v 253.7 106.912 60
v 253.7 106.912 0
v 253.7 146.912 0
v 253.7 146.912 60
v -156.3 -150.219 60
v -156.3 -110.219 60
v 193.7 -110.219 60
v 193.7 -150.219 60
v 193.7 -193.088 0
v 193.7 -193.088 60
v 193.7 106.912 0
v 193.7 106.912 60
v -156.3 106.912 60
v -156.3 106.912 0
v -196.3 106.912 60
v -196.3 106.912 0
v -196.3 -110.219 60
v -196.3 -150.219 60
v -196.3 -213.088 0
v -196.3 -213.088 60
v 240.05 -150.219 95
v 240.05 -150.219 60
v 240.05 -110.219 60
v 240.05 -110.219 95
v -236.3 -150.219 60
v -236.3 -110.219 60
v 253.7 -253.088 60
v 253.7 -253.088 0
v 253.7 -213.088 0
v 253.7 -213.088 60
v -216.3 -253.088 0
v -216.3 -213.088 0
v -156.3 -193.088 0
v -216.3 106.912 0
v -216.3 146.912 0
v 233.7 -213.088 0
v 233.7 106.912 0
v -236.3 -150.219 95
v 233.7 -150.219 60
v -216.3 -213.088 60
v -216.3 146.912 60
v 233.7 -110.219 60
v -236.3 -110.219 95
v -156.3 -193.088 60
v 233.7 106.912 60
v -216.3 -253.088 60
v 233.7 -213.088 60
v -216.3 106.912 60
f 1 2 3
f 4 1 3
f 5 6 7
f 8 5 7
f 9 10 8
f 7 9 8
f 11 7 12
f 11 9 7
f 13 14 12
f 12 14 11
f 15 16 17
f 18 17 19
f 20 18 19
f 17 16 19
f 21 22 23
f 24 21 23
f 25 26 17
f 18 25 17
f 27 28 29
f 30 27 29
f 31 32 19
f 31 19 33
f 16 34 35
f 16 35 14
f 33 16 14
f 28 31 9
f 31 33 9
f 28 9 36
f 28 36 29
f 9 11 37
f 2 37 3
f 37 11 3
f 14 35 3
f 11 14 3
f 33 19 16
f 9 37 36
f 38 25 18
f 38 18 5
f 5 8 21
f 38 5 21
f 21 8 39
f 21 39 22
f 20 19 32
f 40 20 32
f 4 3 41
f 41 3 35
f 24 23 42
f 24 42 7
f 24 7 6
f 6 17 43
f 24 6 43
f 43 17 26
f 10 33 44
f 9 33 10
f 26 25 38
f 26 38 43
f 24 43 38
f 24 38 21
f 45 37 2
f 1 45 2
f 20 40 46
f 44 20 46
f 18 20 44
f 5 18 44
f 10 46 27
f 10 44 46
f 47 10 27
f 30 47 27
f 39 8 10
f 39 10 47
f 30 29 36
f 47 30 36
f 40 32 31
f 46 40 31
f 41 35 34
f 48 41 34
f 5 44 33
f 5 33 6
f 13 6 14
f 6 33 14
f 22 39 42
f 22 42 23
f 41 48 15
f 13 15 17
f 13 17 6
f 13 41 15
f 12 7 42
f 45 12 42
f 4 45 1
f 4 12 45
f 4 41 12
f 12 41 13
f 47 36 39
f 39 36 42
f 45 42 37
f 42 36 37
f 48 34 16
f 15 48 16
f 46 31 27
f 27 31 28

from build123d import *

# Parameters (mm, degrees)
F0_W     = 350
F0_H     = 300
F1_DEPTH = 60
F2_W     = 40
F2_H     = 40
F2_W_2   = 350
F2_W_3   = 6.35
F3_DEPTH = 35


with BuildPart() as f1:
    # F0 (on Top) → F1 (new body)
    with BuildSketch(Plane.XY):
        Polygon((253.7002617121, 146.9119131565), (-216.2997382879, 146.9119131565), (-216.2997382879, 106.9119131565), (-196.2997382879, 106.9119131565), (-196.2997382879, -213.0880868435), (-216.2997382879, -213.0880868435), (-216.2997382879, -253.0880868435), (253.7002617121, -253.0880868435), (253.7002617121, -213.0880868435), (233.7002617121, -213.0880868435), (233.7002617121, 106.9119131565), (253.7002617121, 106.9119131565), align=None)
        with Locations((18.7002617121, -43.0880868435)):
            Rectangle(F0_W, F0_H, mode=Mode.SUBTRACT)
    extrude(amount=F1_DEPTH)

    # F2 (on face) → F3 (join)
    with BuildSketch(Plane.XY.offset(60)):
        with Locations((-216.2997382879, -130.2192318439)):
            Rectangle(F2_W, F2_H)
        with Locations((-176.2997382879, -130.2192318439)):
            Rectangle(F2_W, F2_H)
        with Locations((18.7002617121, -130.2192318439)):
            Rectangle(F2_W_2, F2_H)
        with Locations((213.7002617121, -130.2192318439)):
            Rectangle(F2_W, F2_H)
        with Locations((236.8752617121, -130.2192318439)):
            Rectangle(F2_W_3, F2_H)
    extrude(amount=F3_DEPTH)


solid = f1.part
